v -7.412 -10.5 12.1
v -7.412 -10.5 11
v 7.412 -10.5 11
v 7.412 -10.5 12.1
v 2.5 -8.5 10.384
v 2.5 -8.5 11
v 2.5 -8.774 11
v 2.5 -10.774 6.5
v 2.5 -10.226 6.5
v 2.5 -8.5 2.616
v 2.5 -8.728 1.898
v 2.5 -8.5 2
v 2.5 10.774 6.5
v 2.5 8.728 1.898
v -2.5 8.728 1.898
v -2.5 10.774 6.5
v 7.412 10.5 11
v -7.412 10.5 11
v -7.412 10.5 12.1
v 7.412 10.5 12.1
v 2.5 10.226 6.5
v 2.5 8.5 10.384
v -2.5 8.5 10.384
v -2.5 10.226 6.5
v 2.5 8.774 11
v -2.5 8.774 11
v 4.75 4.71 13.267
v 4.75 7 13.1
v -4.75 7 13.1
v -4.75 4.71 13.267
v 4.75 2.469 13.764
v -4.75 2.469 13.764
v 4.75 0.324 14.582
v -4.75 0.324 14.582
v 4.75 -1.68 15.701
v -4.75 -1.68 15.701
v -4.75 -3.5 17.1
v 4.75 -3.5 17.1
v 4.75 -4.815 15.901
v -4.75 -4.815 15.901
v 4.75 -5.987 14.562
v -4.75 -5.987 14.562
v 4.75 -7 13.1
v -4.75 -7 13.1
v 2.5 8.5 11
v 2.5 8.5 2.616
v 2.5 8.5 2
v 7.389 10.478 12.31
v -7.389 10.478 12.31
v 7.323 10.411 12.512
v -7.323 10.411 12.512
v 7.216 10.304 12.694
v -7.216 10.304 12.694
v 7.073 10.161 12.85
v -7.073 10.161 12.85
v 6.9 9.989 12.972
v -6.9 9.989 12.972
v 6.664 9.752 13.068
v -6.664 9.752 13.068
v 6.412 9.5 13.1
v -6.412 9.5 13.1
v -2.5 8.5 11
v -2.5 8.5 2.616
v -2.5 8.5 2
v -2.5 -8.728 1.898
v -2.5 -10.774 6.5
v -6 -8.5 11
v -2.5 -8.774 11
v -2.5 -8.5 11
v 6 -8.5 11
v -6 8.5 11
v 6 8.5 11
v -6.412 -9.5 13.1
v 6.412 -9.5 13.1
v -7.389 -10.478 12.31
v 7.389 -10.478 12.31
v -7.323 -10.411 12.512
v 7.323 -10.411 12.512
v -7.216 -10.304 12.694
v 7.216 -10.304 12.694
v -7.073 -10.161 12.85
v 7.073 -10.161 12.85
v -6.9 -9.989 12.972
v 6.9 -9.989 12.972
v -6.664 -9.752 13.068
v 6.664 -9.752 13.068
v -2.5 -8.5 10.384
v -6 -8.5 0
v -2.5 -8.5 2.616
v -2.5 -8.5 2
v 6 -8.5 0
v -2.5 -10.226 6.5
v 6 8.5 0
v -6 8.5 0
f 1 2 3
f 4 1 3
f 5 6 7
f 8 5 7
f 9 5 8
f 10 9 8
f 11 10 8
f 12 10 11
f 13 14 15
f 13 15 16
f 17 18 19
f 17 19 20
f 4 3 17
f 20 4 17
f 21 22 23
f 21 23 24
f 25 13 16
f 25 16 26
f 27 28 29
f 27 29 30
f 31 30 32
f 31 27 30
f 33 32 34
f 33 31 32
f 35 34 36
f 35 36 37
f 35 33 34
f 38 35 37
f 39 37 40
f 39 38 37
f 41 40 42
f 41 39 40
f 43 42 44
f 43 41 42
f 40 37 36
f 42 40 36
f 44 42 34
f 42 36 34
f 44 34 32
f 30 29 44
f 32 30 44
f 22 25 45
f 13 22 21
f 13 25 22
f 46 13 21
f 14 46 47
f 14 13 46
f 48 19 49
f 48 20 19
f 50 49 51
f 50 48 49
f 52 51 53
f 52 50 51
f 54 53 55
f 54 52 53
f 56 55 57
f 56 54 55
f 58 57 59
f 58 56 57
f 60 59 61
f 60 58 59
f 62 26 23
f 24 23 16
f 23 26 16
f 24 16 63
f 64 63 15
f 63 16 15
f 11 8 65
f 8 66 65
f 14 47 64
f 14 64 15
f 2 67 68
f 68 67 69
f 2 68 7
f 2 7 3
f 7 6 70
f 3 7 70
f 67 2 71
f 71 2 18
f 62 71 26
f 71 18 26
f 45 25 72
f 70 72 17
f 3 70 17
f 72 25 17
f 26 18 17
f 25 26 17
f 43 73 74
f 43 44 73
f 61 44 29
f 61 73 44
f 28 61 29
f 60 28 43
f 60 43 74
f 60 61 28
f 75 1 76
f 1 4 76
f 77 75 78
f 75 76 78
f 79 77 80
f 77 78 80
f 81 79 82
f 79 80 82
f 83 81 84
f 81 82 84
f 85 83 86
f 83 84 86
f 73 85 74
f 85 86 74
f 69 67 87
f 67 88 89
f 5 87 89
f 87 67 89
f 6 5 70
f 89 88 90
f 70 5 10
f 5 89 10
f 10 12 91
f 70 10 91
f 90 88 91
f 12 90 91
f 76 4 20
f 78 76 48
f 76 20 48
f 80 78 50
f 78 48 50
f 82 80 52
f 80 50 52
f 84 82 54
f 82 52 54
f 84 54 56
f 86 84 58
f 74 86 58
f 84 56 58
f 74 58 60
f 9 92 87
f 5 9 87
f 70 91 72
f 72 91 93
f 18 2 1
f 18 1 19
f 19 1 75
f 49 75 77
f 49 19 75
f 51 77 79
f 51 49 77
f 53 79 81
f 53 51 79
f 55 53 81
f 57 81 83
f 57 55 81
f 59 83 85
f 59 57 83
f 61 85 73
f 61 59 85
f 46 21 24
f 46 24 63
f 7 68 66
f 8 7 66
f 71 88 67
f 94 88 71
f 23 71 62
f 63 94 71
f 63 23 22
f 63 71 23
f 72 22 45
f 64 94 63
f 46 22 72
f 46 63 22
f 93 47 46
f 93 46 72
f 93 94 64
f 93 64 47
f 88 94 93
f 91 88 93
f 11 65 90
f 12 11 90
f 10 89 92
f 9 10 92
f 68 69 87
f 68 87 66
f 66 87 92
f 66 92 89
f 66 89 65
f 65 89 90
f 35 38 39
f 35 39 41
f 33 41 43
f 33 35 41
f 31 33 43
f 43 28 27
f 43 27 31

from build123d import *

# Parameters (mm, degrees)
ESQUISSE1_W        = 12
ESQUISSE1_H        = 17
BOSS_EXTRU_1_DEPTH = 11
ESQUISSE2_W        = 14.823529412
ESQUISSE2_H        = 21
BOSS_EXTRU_2_DEPTH = 2.1
BOSS_EXTRU_3_DEPTH = 4.75
EXTRU_MINCE1_DEPTH = 2.5
CONG_1_R           = 1


with BuildPart() as part:
    # Esquisse1 → Boss.-Extru.1 (new body)
    with BuildSketch(Plane.XY):
        Rectangle(ESQUISSE1_W, ESQUISSE1_H)
    extrude(amount=BOSS_EXTRU_1_DEPTH)

    # Esquisse2 → Boss.-Extru.2 (add)
    with BuildSketch(Plane.XY.offset(11)):
        Rectangle(ESQUISSE2_W, ESQUISSE2_H)
    extrude(amount=BOSS_EXTRU_2_DEPTH)

    # Esquisse3 → Boss.-Extru.3 (add, symmetric)
    with BuildSketch(Plane(origin=(0, 0, 0), x_dir=(0, 0, -1), z_dir=(1, 0, 0))):
        with BuildLine():
            Line((-13.1, -7), (-13.1, 7))
            ThreePointArc((-13.1, 7), (-14.133865433, 1.381948736), (-17.1, -3.5))
            ThreePointArc((-17.1, -3.5), (-15.248408263, -5.419609444), (-13.1, -7))
        make_face()
    extrude(amount=BOSS_EXTRU_3_DEPTH, both=True)

    # Esquisse4 → Extru.-Mince1 (add, symmetric)
    with BuildSketch(Plane(origin=(0, 0, 0), x_dir=(0, 0, -1), z_dir=(1, 0, 0))):
        Polygon((-11.101534617, -8.728452887), (-6.5, -10.773579383), (-1.898465383, -8.728452887), (-2.101534617, -8.271547113), (-6.5, -10.226420617), (-10.898465383, -8.271547113), align=None)
        Polygon((-10.898465383, 8.271547113), (-6.5, 10.226420617), (-2.101534617, 8.271547113), (-1.898465383, 8.728452887), (-6.5, 10.773579383), (-11.101534617, 8.728452887), align=None)
    extrude(amount=EXTRU_MINCE1_DEPTH, both=True)

    # Congé1
    cong_1_edges = [part.edges().sort_by_distance(p)[0] for p in [
        (7.411764706, 0, 13.1),
        (0, 10.5, 13.1),
        (-7.411764706, 0, 13.1),
        (0, -10.5, 13.1),
    ]]
    fillet(cong_1_edges, radius=CONG_1_R)


solid = part.part
